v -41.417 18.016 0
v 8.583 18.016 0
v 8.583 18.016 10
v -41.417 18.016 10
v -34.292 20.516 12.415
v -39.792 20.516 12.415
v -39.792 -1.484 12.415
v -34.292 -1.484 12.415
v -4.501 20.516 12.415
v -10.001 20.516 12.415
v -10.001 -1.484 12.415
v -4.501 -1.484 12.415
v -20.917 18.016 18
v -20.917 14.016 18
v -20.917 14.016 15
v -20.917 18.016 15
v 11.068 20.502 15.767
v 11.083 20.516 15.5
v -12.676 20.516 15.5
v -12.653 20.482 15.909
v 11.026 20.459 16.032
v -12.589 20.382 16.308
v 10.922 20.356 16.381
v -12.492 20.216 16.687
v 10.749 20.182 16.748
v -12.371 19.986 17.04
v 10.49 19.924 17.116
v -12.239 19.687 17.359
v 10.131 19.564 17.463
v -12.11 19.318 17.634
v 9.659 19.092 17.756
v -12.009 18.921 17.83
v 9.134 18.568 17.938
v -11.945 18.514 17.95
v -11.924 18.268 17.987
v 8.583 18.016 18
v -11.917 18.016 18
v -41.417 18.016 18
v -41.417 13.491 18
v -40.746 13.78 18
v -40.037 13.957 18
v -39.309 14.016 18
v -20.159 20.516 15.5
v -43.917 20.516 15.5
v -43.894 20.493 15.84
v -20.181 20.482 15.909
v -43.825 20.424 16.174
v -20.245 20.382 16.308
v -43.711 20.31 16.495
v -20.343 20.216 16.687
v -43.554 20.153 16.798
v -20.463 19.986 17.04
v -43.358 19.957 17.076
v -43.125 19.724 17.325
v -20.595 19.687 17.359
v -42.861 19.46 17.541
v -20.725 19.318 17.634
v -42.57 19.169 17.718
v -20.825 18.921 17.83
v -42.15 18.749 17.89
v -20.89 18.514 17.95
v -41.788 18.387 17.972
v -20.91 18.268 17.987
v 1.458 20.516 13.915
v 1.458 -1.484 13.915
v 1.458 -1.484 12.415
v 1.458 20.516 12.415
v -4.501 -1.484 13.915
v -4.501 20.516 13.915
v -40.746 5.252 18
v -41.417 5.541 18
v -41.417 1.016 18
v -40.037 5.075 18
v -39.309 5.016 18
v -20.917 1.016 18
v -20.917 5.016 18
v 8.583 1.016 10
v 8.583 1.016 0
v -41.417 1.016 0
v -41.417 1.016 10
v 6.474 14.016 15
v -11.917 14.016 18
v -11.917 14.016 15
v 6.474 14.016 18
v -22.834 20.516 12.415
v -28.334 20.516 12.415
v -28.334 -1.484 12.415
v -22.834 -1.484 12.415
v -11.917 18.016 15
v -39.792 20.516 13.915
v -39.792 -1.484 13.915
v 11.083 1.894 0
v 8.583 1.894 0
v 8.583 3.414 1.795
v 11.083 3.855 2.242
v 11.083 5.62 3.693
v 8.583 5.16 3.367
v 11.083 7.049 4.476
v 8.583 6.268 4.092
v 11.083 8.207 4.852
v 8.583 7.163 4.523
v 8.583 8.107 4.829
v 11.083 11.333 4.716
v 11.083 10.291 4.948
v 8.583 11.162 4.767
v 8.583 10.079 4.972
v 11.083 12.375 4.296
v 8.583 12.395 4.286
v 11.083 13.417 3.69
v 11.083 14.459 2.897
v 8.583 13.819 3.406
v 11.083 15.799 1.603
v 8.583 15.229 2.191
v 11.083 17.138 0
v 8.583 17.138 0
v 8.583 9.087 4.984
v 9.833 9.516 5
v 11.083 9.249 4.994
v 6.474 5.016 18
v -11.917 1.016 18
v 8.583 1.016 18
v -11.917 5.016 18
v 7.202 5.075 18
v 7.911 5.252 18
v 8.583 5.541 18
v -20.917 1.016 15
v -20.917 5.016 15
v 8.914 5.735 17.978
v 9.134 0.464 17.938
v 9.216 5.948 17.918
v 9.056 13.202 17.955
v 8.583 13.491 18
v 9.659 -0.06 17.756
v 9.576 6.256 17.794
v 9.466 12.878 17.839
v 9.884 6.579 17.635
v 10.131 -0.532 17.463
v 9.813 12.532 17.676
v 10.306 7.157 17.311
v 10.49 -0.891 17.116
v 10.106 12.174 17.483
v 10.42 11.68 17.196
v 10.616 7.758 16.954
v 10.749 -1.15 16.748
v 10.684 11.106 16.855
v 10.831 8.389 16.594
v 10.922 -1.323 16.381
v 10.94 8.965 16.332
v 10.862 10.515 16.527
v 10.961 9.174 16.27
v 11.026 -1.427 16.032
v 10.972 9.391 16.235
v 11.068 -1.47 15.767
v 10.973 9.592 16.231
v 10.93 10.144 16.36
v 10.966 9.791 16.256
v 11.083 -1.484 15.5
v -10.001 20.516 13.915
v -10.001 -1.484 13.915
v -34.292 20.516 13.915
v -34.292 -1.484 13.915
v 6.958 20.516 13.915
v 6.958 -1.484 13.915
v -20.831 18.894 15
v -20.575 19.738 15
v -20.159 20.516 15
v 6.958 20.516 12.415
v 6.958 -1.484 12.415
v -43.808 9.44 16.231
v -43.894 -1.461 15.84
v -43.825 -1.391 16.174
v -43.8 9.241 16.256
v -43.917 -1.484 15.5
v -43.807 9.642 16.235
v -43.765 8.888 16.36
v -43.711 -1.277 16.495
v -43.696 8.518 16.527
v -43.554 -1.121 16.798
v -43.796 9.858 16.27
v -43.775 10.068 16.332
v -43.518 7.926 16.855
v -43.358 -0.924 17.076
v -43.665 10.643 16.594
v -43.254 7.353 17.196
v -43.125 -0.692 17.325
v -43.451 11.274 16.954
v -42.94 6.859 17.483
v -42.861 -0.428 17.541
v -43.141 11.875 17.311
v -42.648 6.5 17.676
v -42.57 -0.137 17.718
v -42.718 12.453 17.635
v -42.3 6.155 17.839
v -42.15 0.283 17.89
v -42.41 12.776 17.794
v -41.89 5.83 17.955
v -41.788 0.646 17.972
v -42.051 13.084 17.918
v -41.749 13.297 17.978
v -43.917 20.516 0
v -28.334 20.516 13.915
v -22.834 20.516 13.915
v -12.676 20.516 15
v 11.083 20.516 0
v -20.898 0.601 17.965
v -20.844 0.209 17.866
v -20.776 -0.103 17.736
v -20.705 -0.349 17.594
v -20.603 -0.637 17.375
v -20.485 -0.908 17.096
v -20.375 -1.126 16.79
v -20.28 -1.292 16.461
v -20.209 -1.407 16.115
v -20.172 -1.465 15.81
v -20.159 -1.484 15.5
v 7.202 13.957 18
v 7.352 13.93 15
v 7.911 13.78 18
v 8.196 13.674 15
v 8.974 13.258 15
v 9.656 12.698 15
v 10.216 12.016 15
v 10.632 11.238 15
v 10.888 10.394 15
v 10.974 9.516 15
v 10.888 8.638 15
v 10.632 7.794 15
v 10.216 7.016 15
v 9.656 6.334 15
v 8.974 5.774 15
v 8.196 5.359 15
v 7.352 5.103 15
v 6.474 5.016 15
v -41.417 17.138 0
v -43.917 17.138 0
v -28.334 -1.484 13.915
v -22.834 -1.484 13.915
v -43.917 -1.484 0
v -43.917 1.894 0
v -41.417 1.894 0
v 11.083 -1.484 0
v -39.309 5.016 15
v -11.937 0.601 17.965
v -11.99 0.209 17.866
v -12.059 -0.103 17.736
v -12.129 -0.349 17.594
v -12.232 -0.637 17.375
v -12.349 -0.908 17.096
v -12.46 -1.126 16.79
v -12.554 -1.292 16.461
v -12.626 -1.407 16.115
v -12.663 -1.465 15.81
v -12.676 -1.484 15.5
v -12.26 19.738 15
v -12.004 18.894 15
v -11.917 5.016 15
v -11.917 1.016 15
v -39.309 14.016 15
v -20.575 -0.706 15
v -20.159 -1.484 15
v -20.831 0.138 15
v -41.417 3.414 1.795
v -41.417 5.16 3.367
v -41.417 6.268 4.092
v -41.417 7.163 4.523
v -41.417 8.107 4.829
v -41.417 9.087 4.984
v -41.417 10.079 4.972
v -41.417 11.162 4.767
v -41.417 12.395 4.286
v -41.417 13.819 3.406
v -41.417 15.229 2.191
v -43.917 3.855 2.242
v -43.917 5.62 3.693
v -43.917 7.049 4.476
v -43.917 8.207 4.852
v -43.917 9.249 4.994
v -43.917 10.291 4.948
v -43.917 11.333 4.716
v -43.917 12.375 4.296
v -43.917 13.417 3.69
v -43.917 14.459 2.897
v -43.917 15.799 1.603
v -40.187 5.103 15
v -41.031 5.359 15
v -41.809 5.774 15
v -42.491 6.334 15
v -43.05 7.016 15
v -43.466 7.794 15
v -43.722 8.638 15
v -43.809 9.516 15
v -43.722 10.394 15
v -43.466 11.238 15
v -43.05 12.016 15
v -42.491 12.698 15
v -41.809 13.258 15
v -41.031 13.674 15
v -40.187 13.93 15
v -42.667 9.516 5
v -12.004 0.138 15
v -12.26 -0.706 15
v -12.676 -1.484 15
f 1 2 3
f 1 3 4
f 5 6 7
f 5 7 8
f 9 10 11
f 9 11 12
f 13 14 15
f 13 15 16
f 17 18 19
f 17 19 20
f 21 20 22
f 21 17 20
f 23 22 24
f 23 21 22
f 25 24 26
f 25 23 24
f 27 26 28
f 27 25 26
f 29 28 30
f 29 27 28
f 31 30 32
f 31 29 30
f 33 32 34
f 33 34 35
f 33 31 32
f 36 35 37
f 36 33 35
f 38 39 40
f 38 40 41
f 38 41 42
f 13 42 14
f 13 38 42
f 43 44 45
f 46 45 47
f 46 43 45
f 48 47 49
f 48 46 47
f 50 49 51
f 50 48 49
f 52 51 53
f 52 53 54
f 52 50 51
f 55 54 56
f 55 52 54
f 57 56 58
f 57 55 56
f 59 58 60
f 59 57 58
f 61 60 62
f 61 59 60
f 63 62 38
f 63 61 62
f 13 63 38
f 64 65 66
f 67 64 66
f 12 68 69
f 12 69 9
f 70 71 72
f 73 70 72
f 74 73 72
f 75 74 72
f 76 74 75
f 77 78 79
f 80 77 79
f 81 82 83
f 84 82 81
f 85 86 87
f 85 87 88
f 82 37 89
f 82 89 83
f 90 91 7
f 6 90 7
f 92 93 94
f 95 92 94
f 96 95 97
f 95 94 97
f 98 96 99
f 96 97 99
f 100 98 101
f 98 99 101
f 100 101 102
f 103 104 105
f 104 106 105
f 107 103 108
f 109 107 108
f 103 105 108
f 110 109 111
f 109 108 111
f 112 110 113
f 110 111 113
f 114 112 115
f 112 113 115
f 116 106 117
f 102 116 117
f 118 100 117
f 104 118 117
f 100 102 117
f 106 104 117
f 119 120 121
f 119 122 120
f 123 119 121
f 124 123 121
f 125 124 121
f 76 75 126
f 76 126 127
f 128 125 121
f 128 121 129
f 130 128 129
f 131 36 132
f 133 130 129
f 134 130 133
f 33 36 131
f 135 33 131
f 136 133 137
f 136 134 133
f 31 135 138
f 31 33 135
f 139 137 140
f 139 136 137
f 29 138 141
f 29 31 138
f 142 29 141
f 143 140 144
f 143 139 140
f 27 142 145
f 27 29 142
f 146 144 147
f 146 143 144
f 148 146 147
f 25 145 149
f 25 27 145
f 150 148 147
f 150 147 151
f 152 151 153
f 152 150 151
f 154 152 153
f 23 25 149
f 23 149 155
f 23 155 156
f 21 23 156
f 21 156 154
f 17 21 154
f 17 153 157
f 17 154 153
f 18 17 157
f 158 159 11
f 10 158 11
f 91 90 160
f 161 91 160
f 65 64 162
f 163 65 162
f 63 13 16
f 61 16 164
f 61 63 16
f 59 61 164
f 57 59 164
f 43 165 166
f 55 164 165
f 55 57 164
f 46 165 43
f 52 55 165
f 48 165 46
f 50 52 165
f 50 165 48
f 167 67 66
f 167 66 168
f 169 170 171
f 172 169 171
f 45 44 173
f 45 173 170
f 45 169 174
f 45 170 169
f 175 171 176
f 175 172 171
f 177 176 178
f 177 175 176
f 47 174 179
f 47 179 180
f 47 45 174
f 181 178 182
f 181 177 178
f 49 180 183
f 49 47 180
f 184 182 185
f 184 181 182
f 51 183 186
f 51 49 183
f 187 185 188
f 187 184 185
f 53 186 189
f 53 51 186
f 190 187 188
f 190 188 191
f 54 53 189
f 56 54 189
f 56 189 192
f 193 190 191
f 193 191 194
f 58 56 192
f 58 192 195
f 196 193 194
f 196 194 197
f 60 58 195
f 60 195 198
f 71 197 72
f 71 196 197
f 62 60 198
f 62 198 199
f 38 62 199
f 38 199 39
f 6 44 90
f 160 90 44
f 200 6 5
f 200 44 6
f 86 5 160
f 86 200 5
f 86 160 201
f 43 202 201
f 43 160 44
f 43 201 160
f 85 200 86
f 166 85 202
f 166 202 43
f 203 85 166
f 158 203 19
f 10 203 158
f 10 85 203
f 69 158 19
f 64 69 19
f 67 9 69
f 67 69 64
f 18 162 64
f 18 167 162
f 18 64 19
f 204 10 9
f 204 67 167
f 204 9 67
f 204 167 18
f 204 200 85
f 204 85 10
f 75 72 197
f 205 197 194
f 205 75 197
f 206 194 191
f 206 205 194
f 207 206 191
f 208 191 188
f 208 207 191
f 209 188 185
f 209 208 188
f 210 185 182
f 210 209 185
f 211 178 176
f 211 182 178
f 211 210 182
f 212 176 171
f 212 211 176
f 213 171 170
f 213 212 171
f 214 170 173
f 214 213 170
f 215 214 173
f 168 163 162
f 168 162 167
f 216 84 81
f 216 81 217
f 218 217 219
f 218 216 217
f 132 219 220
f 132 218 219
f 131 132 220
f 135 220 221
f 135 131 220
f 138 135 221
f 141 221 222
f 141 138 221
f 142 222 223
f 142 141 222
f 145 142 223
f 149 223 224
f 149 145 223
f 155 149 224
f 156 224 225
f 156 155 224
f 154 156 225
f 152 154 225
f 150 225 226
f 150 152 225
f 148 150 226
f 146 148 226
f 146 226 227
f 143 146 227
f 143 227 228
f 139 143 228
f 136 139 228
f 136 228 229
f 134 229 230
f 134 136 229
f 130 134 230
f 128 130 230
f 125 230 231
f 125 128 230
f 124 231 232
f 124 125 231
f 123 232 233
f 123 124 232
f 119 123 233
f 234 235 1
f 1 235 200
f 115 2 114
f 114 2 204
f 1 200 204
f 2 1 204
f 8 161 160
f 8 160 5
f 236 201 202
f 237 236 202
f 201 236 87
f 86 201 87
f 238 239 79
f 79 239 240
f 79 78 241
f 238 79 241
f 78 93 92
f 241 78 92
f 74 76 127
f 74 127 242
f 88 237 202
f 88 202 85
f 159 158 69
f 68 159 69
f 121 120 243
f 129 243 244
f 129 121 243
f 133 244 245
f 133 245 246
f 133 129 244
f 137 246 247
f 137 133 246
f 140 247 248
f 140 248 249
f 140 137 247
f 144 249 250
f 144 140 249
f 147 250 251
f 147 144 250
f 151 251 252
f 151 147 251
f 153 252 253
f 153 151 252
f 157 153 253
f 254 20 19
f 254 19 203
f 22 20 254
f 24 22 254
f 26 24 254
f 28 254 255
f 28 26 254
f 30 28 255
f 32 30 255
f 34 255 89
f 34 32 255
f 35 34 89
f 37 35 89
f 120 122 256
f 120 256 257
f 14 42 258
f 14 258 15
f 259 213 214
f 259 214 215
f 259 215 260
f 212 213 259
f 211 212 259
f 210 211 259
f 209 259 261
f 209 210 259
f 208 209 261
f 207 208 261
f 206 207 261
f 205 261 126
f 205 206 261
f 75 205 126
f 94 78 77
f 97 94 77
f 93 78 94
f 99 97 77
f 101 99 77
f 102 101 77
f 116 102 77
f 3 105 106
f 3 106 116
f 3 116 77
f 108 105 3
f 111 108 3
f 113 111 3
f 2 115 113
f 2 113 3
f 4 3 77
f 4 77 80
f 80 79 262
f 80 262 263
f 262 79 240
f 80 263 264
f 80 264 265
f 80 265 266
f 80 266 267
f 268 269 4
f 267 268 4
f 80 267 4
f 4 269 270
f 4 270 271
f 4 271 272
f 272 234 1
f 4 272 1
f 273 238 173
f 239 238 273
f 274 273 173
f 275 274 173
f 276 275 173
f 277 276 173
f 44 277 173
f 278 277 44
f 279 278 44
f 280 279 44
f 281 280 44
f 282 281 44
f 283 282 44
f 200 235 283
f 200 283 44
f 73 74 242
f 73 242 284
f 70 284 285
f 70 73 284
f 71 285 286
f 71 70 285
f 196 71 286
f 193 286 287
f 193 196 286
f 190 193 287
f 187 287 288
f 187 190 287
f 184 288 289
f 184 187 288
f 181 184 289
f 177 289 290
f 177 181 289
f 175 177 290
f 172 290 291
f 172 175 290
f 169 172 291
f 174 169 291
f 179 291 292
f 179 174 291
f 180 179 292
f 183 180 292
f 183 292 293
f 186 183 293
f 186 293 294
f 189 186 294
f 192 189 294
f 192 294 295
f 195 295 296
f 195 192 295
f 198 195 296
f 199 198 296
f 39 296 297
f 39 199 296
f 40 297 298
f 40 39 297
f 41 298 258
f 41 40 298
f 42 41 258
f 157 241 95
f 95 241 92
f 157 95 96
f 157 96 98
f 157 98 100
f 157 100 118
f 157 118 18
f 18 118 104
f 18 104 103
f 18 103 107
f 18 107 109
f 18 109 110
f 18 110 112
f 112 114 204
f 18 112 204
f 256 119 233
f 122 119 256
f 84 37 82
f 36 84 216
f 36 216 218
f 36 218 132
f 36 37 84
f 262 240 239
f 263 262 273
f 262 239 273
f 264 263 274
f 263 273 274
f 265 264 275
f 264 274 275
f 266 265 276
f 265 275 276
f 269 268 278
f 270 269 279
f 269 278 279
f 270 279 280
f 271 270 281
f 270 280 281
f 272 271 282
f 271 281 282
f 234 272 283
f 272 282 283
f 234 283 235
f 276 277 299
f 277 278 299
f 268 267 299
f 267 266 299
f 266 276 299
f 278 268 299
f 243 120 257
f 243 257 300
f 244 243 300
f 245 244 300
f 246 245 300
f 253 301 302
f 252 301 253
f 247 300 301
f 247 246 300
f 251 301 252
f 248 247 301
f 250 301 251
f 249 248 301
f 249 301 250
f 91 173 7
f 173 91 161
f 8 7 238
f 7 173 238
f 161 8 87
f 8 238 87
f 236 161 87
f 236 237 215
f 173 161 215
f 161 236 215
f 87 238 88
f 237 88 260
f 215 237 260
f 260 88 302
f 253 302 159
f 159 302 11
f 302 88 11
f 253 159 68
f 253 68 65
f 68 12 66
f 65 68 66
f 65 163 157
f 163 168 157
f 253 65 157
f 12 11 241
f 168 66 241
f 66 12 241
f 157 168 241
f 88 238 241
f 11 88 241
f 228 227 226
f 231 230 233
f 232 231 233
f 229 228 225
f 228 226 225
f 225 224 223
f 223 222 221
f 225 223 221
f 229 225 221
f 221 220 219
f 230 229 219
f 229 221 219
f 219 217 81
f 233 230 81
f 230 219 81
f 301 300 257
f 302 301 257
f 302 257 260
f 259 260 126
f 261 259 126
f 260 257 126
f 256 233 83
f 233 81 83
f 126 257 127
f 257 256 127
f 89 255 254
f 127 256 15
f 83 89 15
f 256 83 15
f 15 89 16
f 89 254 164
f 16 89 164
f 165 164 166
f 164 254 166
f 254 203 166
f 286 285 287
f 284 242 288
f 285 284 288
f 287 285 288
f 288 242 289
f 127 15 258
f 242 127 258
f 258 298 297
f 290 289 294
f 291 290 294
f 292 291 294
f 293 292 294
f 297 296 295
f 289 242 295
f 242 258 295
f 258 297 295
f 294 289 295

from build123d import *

# Parameters (mm, degrees)
SKETCH1_W           = 55
SKETCH1_H           = 22
BOSS_EXTRUDE1_DEPTH = 18
CUT_EXTRUDE2_START  = -55
CUT_EXTRUDE2_DEPTH  = 55
SKETCH5_W           = 50
SKETCH5_H           = 17
CUT_EXTRUDE3_DEPTH  = 10
FILLET1_R           = 2.5
CUT_EXTRUDE4_DEPTH  = 3
SKETCH8_W           = 5.5
SKETCH8_H           = 1.5
CUT_EXTRUDE5_DEPTH  = 32


# Read off the part's stored shape, not the designer's step: Cut-Extrude2
with BuildPart() as part:
    # Sketch1 → Boss-Extrude1 (new body)
    with BuildSketch(Plane.XY):
        with Locations((-16.417297699, 9.516109874)):
            Rectangle(SKETCH1_W, SKETCH1_H)
    extrude(amount=BOSS_EXTRUDE1_DEPTH)

    # Cut-Extrude2 outline → Cut-Extrude2 (cut)
    with BuildSketch(Plane(origin=(11.082702301, 0, 0), x_dir=(0, 0, -1), z_dir=(1, 0, 0)).offset(CUT_EXTRUDE2_START)):
        with BuildLine():
            add(Edge.make_bspline(
                [(0, 1.8942341), (-9.999457611, 9.516109874), (0, 17.137985647)],
                knots=[0, 0, 0, 1, 1, 1], degree=2))
            Line((0, 1.8942341), (0, 17.137985647))
        make_face()
    extrude(amount=CUT_EXTRUDE2_DEPTH, mode=Mode.SUBTRACT)

    # Sketch5 → Cut-Extrude3 (cut)
    with BuildSketch(Plane(origin=(0, 0, 0), x_dir=(-1, 0, 0), z_dir=(0, 0, -1))):
        with Locations((16.417297699, 9.516109874)):
            Rectangle(SKETCH5_W, SKETCH5_H)
    extrude(amount=-CUT_EXTRUDE3_DEPTH, mode=Mode.SUBTRACT)

    # Fillet1
    fillet1_edges = [part.edges().sort_by_distance(p)[0] for p in [
        (11.082702301, 9.516109874, 18),
        (-16.417297699, 20.516109874, 18),
        (-43.917297699, 9.516109874, 18),
        (-16.417297699, -1.483890126, 18),
    ]]
    fillet(fillet1_edges, radius=FILLET1_R)

    # Sketch7 → Cut-Extrude4 (cut)
    with BuildSketch(Plane.XY.offset(18)):
        with BuildLine():
            Line((-39.308664902, 14.016109874), (-20.917297699, 14.016109874))
            Line((-20.917297699, 14.016109874), (-20.917297699, 18.016109874))
            ThreePointArc((-20.917297699, 18.016109874), (-16.417297699, 22.516109874), (-11.917297699, 18.016109874))
            Line((-11.917297699, 18.016109874), (-11.917297699, 14.016109874))
            Line((-11.917297699, 14.016109874), (6.474069505, 14.016109874))
            ThreePointArc((6.474069505, 14.016109874), (10.974069505, 9.516109874), (6.474069505, 5.016109874))
            Line((6.474069505, 5.016109874), (-11.917297699, 5.016109874))
            Line((-11.917297699, 5.016109874), (-11.917297699, 1.016109874))
            ThreePointArc((-11.917297699, 1.016109874), (-16.417297699, -3.483890126), (-20.917297699, 1.016109874))
            Line((-20.917297699, 1.016109874), (-20.917297699, 5.016109874))
            Line((-20.917297699, 5.016109874), (-39.308664902, 5.016109874))
            ThreePointArc((-39.308664902, 5.016109874), (-43.808664902, 9.516109874), (-39.308664902, 14.016109874))
        make_face()
    extrude(amount=-CUT_EXTRUDE4_DEPTH, mode=Mode.SUBTRACT)

    # Sketch8 → Cut-Extrude5 (cut)
    with BuildSketch(Plane(origin=(0, 20.516109874, 0), x_dir=(1, 0, 0), z_dir=(0, 1, 0))):
        with Locations((-37.042297699, -13.165280764)):
            Rectangle(SKETCH8_W, SKETCH8_H)
        with Locations((-7.250631032, -13.165280764)):
            Rectangle(SKETCH8_W, SKETCH8_H)
        with Locations((4.207702301, -13.165280764)):
            Rectangle(SKETCH8_W, SKETCH8_H)
        with Locations((-25.583964365, -13.165280764)):
            Rectangle(SKETCH8_W, SKETCH8_H)
    extrude(amount=-CUT_EXTRUDE5_DEPTH, mode=Mode.SUBTRACT)


solid = part.part
